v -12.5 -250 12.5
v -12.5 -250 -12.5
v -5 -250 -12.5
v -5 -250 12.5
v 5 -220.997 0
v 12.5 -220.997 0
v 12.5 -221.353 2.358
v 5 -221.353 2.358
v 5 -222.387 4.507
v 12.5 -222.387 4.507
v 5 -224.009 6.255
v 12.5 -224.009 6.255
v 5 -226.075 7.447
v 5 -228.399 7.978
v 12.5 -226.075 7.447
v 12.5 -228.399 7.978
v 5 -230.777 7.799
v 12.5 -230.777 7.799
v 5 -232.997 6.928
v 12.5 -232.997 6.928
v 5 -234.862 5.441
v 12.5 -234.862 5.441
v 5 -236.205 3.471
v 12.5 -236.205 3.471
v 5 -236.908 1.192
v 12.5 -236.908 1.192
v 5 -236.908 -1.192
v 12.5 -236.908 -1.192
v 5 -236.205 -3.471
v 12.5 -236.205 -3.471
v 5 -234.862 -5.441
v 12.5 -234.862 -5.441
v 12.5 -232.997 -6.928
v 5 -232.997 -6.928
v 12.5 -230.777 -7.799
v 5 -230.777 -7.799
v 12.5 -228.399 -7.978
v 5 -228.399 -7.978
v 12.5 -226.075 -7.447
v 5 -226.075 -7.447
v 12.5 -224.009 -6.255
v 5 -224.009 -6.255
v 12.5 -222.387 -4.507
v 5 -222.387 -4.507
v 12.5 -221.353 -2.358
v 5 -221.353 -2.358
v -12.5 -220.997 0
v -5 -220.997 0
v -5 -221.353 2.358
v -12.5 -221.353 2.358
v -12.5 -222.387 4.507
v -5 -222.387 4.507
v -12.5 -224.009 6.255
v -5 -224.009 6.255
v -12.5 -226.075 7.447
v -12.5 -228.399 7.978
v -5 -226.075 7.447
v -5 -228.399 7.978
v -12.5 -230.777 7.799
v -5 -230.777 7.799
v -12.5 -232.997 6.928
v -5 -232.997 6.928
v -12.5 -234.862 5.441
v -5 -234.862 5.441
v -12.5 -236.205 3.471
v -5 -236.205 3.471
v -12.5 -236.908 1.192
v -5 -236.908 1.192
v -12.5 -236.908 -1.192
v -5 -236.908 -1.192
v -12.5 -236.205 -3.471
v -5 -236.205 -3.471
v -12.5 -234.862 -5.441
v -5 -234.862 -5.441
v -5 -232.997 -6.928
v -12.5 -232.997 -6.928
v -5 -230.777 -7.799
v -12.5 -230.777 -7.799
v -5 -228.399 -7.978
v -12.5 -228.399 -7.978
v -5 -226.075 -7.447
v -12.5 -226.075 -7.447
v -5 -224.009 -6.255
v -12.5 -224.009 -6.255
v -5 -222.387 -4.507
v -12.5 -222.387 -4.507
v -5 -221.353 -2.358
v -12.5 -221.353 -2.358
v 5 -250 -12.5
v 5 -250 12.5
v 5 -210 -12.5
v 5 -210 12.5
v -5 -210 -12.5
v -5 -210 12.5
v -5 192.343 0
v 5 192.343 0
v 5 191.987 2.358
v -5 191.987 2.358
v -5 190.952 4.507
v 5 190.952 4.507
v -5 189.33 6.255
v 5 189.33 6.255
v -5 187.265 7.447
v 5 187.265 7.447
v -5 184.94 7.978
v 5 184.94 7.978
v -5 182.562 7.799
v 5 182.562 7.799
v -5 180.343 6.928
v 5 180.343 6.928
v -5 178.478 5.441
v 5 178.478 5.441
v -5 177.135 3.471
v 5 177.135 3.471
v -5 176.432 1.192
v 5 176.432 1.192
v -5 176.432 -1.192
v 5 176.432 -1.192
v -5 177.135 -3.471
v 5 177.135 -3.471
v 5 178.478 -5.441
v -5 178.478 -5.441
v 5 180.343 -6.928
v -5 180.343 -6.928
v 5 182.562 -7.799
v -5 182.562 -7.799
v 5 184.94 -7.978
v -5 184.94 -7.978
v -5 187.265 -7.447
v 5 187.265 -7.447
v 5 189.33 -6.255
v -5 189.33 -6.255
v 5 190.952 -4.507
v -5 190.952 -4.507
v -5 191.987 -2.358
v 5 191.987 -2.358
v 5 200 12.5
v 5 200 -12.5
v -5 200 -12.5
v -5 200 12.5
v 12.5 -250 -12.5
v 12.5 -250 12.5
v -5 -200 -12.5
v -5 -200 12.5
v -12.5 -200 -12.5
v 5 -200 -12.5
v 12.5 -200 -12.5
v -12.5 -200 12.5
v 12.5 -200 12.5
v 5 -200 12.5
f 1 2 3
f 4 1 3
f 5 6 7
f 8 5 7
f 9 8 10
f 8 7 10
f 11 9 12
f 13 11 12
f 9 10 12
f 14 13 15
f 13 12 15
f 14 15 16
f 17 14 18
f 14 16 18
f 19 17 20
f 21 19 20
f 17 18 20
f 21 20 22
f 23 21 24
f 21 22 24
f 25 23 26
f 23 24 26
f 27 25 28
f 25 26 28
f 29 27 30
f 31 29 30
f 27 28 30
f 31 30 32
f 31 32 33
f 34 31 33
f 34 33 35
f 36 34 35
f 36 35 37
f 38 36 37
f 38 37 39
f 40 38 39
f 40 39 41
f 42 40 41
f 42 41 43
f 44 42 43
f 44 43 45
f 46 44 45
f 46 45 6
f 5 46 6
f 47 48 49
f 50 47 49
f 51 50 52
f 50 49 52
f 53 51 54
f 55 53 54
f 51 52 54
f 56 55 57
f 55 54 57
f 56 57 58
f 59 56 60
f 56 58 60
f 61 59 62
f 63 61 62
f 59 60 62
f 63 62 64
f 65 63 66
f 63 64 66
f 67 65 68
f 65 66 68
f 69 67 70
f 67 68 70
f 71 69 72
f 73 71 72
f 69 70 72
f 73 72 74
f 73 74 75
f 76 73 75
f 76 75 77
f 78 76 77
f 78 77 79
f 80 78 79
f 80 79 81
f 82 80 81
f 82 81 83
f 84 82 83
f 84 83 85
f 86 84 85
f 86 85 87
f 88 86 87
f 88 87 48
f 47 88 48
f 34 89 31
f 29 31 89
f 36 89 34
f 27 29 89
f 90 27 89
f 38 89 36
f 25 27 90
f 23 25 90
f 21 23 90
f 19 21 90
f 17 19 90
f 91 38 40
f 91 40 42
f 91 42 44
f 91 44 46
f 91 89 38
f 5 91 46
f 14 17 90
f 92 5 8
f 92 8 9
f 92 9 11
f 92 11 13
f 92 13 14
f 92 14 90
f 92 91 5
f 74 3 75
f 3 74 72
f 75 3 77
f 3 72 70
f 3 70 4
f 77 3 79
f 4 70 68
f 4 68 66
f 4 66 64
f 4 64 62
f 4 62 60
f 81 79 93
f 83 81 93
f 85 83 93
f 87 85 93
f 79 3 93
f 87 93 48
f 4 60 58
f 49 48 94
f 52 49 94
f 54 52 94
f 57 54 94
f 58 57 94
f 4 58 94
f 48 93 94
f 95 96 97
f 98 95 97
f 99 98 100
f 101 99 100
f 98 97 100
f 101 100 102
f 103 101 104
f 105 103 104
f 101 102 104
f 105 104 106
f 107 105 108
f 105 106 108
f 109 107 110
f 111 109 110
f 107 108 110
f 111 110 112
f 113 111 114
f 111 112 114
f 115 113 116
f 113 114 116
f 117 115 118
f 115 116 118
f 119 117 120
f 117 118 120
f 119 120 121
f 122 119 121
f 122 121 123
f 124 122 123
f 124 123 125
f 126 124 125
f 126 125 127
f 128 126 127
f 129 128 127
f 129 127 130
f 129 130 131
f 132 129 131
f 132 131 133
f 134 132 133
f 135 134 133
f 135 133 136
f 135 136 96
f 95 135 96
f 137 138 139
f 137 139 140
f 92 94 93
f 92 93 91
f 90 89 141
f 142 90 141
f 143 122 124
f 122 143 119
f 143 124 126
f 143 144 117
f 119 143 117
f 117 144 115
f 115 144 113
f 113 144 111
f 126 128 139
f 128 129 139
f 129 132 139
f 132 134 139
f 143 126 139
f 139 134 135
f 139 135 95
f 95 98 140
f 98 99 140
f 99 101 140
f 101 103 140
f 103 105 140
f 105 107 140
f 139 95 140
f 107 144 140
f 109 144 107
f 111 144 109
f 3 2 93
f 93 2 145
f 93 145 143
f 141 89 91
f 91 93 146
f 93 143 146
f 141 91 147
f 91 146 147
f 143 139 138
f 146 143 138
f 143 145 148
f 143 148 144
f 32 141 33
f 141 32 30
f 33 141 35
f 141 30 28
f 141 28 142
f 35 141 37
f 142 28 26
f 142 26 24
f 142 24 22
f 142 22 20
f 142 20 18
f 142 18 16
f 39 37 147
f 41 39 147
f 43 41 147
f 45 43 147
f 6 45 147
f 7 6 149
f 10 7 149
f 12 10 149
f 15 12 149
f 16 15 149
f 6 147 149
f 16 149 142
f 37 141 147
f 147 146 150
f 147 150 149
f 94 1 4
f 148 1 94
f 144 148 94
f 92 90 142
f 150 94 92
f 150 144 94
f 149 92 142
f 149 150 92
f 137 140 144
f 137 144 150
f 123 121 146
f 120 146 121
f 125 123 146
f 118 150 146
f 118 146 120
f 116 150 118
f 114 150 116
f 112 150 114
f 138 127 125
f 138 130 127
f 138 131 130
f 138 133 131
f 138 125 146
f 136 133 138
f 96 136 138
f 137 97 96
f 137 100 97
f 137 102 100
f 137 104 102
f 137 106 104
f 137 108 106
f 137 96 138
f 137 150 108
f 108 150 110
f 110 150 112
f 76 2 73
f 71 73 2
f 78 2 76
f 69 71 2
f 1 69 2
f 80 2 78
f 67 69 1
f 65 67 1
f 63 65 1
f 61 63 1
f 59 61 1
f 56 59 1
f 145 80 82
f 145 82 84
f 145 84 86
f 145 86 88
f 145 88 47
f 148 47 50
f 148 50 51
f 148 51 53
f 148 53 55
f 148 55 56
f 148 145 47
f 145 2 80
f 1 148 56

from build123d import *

# Parameters (mm, degrees)
F0_W          = 400
F0_H          = 25
F1_DEPTH      = 5
F1_DEPTH_BACK = 5
F2_W          = 7.5
F2_H          = 25
F2_W_2        = 10
F3_DEPTH      = 10
F4_W          = 7.5
F4_H          = 25
F5_DEPTH      = 40
F6_R          = 8
F7_DEPTH      = 25
F8_R          = 8
F9_DEPTH      = 25
F10_R         = 8
F11_DEPTH     = 25


with BuildPart() as f1:
    # F0 (on Right) → F1 (new body, two sides)
    with BuildSketch(Plane.YZ) as f1_sk:
        Rectangle(F0_W, F0_H)
    extrude(amount=F1_DEPTH)
    extrude(f1_sk.sketch, amount=-F1_DEPTH_BACK)

    # F2 (on face) → F3 (join)
    with BuildSketch(Plane.XZ.offset(200)):
        with Locations((-8.75, 0)):
            Rectangle(F2_W, F2_H)
        Rectangle(F2_W_2, F2_H)
        with Locations((8.75, 0)):
            Rectangle(F2_W, F2_H)
    extrude(amount=F3_DEPTH)

    # F4 (on face) → F5 (join)
    with BuildSketch(Plane.XZ.offset(210)):
        with Locations((8.75, 0)):
            Rectangle(F4_W, F4_H)
        with Locations((-8.75, 0)):
            Rectangle(F4_W, F4_H)
    extrude(amount=F5_DEPTH)

    # F6 (on face) → F7 (cut)
    with BuildSketch(Plane.YZ.offset(12.5)):
        with Locations((-228.9973199368, 0)):
            Circle(F6_R)
    extrude(amount=-F7_DEPTH, mode=Mode.SUBTRACT)

    # F8 (on face) → F9 (cut)
    with BuildSketch(Plane.YZ.offset(5)):
        with Locations((234.8896563053, 0)):
            Circle(F8_R)
    extrude(amount=-F9_DEPTH, mode=Mode.SUBTRACT)

    # F10 (on face) → F11 (cut)
    with BuildSketch(Plane.YZ.offset(5)):
        with Locations((184.34253335, 0)):
            Circle(F10_R)
    extrude(amount=-F11_DEPTH, mode=Mode.SUBTRACT)


solid = f1.part
